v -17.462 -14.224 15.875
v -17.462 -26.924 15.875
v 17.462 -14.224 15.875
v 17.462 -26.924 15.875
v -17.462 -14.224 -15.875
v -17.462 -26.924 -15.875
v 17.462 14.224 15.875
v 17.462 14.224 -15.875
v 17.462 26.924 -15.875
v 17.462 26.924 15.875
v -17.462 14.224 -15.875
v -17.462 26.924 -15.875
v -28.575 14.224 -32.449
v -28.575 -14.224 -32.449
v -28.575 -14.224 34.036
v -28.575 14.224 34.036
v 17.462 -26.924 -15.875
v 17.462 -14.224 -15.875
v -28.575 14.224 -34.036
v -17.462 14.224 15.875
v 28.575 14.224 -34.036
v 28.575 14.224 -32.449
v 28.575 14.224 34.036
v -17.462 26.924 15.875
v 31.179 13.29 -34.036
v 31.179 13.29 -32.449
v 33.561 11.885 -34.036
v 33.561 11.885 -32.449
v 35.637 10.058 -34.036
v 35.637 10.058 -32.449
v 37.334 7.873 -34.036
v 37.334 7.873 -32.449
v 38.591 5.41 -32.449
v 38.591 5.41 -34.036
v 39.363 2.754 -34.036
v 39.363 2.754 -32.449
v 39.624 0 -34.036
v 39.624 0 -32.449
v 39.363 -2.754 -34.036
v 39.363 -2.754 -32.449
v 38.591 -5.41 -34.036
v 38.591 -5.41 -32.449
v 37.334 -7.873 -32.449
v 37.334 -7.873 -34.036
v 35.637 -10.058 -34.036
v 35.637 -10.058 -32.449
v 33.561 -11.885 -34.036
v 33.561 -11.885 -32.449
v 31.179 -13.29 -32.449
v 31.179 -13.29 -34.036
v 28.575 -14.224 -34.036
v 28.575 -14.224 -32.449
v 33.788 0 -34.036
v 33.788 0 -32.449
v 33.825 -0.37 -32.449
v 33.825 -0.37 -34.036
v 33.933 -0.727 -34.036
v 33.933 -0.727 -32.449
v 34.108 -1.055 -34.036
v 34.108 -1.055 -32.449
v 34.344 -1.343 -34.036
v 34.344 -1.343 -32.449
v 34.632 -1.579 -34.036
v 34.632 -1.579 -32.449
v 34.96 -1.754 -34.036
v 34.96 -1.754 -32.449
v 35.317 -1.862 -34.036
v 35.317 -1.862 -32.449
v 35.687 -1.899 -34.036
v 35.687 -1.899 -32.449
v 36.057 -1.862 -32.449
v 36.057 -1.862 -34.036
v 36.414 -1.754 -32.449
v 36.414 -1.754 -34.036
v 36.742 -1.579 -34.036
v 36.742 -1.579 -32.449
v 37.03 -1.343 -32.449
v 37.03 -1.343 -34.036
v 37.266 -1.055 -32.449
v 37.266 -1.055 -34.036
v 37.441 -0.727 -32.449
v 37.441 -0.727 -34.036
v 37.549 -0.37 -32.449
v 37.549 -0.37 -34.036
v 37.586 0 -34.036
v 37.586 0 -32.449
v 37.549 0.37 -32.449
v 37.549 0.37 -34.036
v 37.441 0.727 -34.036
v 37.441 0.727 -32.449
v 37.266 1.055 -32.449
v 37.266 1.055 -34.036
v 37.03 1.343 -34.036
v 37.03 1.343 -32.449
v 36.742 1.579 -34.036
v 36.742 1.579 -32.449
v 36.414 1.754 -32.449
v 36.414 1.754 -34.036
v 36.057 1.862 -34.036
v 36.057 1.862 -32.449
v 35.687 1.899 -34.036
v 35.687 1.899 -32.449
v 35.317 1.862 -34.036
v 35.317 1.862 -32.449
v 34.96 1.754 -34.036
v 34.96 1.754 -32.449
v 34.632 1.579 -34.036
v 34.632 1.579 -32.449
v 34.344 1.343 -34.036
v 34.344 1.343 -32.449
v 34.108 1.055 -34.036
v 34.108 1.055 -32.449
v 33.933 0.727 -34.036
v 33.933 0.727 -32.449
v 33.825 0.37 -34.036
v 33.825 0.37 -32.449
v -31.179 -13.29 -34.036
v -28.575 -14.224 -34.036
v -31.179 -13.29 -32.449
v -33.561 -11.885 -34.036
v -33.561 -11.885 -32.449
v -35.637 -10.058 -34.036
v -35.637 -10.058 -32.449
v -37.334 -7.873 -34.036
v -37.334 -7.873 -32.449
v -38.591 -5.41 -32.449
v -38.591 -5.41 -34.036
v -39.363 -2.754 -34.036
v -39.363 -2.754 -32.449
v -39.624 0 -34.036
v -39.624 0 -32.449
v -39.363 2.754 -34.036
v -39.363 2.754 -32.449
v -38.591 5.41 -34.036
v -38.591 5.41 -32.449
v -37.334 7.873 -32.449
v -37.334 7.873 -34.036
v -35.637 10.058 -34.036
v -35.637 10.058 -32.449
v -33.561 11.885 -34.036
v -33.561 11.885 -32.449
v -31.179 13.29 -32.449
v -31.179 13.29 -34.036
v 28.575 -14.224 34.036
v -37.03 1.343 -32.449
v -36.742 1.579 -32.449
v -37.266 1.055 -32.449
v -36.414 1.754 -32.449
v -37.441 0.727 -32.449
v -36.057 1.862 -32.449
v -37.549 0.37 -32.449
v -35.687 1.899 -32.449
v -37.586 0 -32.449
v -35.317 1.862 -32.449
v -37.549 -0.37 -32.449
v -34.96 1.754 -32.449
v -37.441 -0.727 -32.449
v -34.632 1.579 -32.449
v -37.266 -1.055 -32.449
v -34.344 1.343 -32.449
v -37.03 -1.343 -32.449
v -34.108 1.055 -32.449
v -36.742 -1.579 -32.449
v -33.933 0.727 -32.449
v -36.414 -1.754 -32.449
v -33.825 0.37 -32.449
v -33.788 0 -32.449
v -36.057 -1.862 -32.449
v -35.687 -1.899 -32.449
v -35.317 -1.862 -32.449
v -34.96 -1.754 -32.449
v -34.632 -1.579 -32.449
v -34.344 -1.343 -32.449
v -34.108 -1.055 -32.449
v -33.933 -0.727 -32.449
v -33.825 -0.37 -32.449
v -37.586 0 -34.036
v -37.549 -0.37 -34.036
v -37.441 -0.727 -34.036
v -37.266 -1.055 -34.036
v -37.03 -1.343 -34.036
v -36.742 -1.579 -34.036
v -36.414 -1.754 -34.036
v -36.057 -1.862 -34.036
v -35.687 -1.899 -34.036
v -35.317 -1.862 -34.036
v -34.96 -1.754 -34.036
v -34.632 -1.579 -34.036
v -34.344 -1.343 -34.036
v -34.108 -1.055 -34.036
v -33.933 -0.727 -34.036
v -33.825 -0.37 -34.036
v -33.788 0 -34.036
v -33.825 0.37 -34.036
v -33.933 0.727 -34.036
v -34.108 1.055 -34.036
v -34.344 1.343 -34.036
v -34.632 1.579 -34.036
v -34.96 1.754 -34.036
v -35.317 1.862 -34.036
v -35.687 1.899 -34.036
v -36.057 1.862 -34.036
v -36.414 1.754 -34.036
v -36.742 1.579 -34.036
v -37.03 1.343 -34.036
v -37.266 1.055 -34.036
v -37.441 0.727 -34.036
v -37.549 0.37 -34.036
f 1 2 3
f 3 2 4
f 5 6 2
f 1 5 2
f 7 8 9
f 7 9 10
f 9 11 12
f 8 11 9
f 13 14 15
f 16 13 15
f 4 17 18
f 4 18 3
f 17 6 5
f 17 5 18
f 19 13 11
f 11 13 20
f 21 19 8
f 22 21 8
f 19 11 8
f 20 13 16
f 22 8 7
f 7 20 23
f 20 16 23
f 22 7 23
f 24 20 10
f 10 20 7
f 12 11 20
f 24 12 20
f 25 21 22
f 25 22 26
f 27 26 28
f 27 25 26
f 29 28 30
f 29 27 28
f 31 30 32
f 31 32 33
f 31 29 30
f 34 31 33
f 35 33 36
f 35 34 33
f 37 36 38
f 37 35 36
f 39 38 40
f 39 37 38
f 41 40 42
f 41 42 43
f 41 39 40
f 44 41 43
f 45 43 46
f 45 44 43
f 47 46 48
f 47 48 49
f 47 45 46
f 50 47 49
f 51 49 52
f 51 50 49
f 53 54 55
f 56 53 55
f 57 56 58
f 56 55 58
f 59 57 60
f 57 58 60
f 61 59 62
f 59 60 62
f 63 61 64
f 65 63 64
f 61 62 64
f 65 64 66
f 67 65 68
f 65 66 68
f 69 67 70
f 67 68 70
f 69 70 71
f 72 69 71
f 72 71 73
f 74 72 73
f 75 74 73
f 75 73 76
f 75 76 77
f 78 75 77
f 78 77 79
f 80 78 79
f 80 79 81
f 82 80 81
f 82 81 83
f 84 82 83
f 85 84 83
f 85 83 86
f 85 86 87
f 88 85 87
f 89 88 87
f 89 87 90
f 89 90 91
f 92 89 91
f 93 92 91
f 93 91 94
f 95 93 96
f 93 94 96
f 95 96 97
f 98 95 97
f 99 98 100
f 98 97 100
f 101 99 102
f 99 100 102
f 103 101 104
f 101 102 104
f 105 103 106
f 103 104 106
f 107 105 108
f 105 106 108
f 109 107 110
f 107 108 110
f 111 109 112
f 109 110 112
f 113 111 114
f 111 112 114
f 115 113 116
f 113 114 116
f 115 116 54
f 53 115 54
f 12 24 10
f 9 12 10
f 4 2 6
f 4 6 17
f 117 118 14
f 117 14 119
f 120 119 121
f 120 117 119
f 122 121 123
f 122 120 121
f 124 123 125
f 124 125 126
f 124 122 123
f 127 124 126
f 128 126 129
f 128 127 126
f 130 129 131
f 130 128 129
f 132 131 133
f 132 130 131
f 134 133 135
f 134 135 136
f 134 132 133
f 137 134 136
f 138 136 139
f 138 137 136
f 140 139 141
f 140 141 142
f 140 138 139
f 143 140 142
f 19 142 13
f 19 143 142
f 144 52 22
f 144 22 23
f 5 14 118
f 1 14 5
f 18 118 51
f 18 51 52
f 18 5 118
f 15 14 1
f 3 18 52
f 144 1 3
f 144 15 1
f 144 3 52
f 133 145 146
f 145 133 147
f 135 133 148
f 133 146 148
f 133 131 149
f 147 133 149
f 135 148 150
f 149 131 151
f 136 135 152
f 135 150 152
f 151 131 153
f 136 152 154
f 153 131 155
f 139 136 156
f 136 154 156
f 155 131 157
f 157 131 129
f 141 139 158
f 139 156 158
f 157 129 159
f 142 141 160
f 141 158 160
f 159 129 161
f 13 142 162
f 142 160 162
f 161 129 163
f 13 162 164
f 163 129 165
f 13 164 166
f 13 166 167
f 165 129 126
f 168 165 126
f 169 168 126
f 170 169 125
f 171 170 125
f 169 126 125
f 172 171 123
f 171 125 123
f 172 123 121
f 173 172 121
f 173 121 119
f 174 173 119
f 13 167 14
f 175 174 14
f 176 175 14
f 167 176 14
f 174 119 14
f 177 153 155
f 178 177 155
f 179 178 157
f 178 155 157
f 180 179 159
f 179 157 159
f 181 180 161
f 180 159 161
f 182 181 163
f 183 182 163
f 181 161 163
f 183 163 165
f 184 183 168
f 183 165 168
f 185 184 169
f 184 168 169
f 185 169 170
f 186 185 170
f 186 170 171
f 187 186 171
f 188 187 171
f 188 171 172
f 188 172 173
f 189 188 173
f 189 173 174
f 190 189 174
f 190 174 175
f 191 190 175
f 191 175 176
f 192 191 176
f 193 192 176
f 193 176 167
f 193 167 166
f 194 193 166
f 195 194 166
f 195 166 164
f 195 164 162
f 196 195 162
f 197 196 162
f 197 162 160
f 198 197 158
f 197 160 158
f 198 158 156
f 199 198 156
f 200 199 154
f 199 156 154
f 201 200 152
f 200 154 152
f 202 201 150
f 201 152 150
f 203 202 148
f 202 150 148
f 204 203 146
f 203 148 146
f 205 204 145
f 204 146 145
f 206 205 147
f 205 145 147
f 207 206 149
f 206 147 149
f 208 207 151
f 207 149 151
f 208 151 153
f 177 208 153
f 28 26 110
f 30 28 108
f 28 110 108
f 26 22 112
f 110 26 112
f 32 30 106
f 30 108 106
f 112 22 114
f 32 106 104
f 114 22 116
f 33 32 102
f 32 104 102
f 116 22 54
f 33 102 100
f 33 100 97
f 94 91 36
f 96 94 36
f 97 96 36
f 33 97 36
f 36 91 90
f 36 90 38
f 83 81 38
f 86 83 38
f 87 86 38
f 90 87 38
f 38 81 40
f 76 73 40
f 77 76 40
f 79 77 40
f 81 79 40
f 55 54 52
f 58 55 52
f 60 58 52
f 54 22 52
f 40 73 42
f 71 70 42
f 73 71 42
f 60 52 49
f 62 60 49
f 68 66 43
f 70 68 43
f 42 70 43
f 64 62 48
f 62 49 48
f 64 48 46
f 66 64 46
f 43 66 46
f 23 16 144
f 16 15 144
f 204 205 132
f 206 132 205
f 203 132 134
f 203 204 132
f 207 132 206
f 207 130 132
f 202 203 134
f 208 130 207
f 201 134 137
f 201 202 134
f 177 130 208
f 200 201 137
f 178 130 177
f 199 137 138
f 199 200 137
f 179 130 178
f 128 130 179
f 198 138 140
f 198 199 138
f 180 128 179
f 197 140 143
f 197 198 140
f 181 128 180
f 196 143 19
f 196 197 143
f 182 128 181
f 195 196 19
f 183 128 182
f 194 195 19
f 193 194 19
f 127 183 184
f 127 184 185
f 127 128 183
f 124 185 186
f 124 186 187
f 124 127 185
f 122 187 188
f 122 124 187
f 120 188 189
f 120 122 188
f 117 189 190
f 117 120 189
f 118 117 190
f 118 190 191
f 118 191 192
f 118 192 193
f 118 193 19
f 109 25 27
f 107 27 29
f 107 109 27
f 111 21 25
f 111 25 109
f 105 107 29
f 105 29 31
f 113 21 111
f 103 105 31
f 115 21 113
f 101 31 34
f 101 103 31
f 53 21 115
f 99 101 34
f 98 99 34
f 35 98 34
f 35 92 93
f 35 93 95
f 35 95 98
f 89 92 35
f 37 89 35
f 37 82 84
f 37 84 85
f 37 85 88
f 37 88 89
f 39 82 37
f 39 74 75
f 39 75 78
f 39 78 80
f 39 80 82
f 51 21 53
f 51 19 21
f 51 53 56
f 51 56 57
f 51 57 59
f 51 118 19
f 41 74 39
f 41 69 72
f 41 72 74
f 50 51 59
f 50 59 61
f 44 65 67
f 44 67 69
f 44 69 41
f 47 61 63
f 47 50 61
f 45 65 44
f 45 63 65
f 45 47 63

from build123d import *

# Parameters (mm, degrees)
F0_W     = 57.15
F0_H     = 68.072
F1_DEPTH = 14.224
F2_W     = 34.925
F2_H     = 31.75
F3_DEPTH = 26.924
F5_DEPTH = 1.5875
F7_D     = 3.7973
F7_DEPTH = 14.605
F7_TIP   = 1.1408240143


with BuildPart() as f1:
    # F0 (on Front) → F1 (new body, symmetric)
    with BuildSketch(Plane.XZ):
        Rectangle(F0_W, F0_H)
    extrude(amount=F1_DEPTH, both=True)

    # F2 (on Front) → F3 (join, symmetric)
    with BuildSketch(Plane.XZ):
        Rectangle(F2_W, F2_H)
    extrude(amount=F3_DEPTH, both=True)

    # F4 (on face) → F5 (join)
    with BuildSketch(Plane(origin=(0, 0, -34.036), x_dir=(1, 0, 0), z_dir=(0, 0, -1))):
        with BuildLine():
            Line((-28.575, -14.224), (-28.575, 14.224))
            ThreePointArc((-28.575, 14.224), (-39.624, 0), (-28.575, -14.224))
        make_face()
        with BuildLine():
            ThreePointArc((28.575, -14.224), (39.624, 0), (28.575, 14.224))
            Line((28.575, 14.224), (28.575, -14.224))
        make_face()
    extrude(amount=-F5_DEPTH)

    # F7
    with Locations(Plane(origin=(0, 0, -34.036), x_dir=(1, 0, 0), z_dir=(0, 0, -1))):
        with Locations((-35.687, 0), (35.687, 0)):
            Hole(F7_D / 2, depth=F7_DEPTH)
            with Locations((0, 0, -(F7_DEPTH + F7_TIP / 2))):  # 118° drill point
                Cone(0, F7_D / 2, F7_TIP, mode=Mode.SUBTRACT)


solid = f1.part
